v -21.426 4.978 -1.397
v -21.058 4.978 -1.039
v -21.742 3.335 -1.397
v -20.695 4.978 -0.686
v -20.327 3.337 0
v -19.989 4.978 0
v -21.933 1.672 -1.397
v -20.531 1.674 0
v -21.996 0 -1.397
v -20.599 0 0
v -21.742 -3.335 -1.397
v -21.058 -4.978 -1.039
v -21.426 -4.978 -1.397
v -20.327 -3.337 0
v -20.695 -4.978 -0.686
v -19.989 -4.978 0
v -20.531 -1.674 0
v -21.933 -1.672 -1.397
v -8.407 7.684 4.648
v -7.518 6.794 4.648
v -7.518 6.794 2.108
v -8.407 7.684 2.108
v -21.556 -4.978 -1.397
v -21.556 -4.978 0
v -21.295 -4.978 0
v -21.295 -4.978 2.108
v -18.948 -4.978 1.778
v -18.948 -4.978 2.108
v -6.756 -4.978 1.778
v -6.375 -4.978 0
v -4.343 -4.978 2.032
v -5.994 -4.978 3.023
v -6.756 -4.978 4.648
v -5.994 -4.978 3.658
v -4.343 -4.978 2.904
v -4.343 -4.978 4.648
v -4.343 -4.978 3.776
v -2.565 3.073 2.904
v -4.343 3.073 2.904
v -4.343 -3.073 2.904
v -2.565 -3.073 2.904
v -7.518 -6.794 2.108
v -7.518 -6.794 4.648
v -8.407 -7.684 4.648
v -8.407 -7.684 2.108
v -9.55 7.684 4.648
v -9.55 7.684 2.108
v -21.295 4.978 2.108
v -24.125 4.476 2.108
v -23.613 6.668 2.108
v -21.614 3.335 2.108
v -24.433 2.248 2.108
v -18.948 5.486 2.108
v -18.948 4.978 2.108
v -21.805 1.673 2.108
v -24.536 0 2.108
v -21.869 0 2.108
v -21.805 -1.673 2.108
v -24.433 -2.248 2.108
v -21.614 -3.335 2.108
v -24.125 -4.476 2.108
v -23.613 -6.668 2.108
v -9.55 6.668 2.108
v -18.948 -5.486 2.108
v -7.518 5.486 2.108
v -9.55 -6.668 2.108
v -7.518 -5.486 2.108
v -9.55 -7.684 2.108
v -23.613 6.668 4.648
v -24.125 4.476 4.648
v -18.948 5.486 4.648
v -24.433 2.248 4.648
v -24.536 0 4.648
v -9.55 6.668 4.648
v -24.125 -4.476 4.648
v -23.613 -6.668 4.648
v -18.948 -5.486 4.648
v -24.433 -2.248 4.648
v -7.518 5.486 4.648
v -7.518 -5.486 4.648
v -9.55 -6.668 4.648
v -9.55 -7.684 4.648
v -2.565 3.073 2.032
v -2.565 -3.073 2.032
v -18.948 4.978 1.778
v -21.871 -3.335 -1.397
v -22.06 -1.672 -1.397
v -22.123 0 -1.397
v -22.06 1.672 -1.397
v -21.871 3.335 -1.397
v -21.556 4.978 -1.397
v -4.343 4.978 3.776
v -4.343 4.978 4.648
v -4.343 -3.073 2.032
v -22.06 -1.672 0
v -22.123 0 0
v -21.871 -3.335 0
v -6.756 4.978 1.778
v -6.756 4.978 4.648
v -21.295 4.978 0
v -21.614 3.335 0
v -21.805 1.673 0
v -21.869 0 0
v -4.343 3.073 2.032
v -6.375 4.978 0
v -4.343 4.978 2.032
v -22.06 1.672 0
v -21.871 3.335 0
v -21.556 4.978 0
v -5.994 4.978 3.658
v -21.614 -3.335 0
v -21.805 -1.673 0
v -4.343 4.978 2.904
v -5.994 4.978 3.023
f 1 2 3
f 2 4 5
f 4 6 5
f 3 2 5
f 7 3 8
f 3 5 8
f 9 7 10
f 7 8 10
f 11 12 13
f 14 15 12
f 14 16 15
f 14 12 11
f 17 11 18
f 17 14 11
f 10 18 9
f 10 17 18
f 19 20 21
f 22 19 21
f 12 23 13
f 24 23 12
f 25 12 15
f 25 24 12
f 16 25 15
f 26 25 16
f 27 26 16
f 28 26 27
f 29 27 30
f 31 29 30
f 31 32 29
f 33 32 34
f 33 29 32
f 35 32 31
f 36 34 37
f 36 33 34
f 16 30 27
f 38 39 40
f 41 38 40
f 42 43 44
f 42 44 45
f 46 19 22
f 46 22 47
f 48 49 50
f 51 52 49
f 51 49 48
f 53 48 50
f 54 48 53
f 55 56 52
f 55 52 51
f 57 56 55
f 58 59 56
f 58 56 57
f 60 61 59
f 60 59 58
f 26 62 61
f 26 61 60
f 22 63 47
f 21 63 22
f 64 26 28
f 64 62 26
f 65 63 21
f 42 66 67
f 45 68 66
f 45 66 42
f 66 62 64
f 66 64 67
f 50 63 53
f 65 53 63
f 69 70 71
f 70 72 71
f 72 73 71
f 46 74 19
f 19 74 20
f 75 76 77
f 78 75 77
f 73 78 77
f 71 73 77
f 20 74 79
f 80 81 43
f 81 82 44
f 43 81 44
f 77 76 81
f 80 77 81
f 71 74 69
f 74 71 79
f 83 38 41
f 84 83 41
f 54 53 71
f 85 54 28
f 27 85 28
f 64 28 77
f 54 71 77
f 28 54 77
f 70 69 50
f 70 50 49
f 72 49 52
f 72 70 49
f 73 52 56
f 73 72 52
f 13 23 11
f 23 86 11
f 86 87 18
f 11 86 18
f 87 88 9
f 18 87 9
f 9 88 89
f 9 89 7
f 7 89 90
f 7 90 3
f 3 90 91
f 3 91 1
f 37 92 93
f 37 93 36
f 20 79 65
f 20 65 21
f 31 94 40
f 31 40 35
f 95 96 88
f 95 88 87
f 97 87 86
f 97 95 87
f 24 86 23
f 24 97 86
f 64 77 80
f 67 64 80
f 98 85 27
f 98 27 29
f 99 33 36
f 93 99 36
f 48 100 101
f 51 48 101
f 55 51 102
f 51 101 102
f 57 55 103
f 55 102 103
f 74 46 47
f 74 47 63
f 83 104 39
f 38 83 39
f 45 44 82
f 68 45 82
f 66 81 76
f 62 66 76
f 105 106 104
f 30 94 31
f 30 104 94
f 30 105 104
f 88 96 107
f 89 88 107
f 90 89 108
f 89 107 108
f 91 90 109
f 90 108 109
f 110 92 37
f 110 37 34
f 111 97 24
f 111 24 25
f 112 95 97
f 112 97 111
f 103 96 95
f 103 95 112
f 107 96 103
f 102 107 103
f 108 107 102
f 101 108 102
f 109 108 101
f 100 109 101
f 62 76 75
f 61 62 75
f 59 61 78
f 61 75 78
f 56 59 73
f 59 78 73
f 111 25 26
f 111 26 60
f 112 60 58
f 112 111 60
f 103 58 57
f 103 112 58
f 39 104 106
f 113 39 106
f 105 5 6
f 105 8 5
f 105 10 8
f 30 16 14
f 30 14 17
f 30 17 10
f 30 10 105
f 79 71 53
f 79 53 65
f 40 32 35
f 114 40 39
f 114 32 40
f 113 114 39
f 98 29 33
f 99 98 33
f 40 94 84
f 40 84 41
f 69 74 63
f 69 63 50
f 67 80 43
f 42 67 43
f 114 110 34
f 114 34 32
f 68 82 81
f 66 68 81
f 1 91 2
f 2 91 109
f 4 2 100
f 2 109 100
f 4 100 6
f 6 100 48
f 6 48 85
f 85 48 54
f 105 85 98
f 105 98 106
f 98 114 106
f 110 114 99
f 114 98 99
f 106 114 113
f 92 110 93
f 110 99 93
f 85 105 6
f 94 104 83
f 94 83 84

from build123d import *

# Parameters (mm, degrees)
F1_DEPTH  = 4.6482
F2_SIZE   = 2.032
F3_W      = 12.192
F3_H      = 2.8702
F4_DEPTH  = 4.9794
F6_DEPTH  = 1.397
F7_SIZE   = 1.39699
F9_DEPTH  = 4.9794
F10_W     = 3.0734
F10_H     = 0.8720666667
F11_DEPTH = 1.778
F13_DEPTH = 2.54
F14_SIZE  = 0.889


# Not quite as in the source:
# - a fillet or chamfer is up to 0.001 mm smaller than in the source, because OpenCascade refuses the exact size


with BuildPart() as f1:
    # F0 (on Top) → F1 (new body)
    with BuildSketch(Plane.XY):
        with BuildLine():
            Line((-21.8694, 0), (-4.3434, 0))
            Line((-4.3434, 0), (-4.3434, 4.9784))
            Line((-4.3434, 4.9784), (-21.2952151856, 4.9784))
            ThreePointArc((-21.2952151856, 4.9784), (-21.7253795748, 2.5057012372), (-21.8694, 0))
        make_face()
    extrude(amount=F1_DEPTH)

    # F2
    f2_edges = [f1.edges().sort_by_distance(p)[0] for p in [
        (-4.3434, 2.4892, 0),
    ]]
    chamfer(f2_edges, length=F2_SIZE)

    # F3 (on face) → F4 (cut, through all)
    with BuildSketch(Plane.XZ):
        with Locations((-12.8524, 3.2131)):
            Rectangle(F3_W, F3_H)
    extrude(amount=-F4_DEPTH, mode=Mode.SUBTRACT)

    # F5 (on face) → F6 (join)
    with BuildSketch(Plane(origin=(0, 0, 0), x_dir=(1, 0, 0), z_dir=(0, 0, -1))):
        with BuildLine():
            ThreePointArc((-22.1234, 0), (-21.9810877831, -2.5053158344), (-21.5559820236, -4.9784))
            Line((-21.5559820236, -4.9784), (-19.9887671906, -4.9784))
            ThreePointArc((-19.9887671906, -4.9784), (-20.4461719061, -2.5078546104), (-20.5994, 0))
            Line((-20.5994, 0), (-22.1234, 0))
        make_face()
    extrude(amount=F6_DEPTH)

    # F7 (size 1.397 in the source; OpenCascade refuses exactly that, so slightly less here)
    f7_edges = [f1.edges().sort_by_distance(p)[0] for p in [
        (-20.446172, 2.507855, -1.397),
    ]]
    chamfer(f7_edges, length=F7_SIZE)

    # F8 (on face) → F9 (cut, through all)
    with BuildSketch(Plane.XZ):
        Polygon((-4.3434, 2.9040666667), (-4.3434, 3.7761333333), (-5.9944, 3.6576), (-5.9944, 3.0226), align=None)
    extrude(amount=-F9_DEPTH, mode=Mode.SUBTRACT)

    # F10 (on face) → F11 (join)
    with BuildSketch(Plane.YZ.offset(-4.3434)):
        with Locations((1.5367, 2.4680333333)):
            Rectangle(F10_W, F10_H)
    extrude(amount=F11_DEPTH)

    # F12 (on face) → F13 (join)
    with BuildSketch(Plane.XY.offset(4.6482)):
        with BuildLine():
            Line((-24.5364, 0), (-18.9484, 0))
            Line((-18.9484, 0), (-18.9484, 5.4864))
            Line((-18.9484, 5.4864), (-7.5184, 5.4864))
            Line((-7.5184, 5.4864), (-7.5184, 7.6835))
            Line((-7.5184, 7.6835), (-9.5504, 7.6835))
            Line((-9.5504, 7.6835), (-9.5504, 6.6675))
            Line((-9.5504, 6.6675), (-23.6131185723, 6.6675))
            ThreePointArc((-23.6131185723, 6.6675), (-24.3044836141, 3.3655610544), (-24.5364, 0))
        make_face()
    extrude(amount=-F13_DEPTH)

    # F14
    f14_edges = [f1.edges().sort_by_distance(p)[0] for p in [
        (-7.5184, 7.6835, 3.3782),
    ]]
    chamfer(f14_edges, length=F14_SIZE)

    # F15: F1 across face


with BuildPart() as f1_1:
    add(f1.part)
    add(f1.part.mirror(Plane(origin=(-14.9823216408, 0, 1.8516826104), x_dir=(1, 0, 0), z_dir=(0, -1, 0))))


solid = f1_1.part
